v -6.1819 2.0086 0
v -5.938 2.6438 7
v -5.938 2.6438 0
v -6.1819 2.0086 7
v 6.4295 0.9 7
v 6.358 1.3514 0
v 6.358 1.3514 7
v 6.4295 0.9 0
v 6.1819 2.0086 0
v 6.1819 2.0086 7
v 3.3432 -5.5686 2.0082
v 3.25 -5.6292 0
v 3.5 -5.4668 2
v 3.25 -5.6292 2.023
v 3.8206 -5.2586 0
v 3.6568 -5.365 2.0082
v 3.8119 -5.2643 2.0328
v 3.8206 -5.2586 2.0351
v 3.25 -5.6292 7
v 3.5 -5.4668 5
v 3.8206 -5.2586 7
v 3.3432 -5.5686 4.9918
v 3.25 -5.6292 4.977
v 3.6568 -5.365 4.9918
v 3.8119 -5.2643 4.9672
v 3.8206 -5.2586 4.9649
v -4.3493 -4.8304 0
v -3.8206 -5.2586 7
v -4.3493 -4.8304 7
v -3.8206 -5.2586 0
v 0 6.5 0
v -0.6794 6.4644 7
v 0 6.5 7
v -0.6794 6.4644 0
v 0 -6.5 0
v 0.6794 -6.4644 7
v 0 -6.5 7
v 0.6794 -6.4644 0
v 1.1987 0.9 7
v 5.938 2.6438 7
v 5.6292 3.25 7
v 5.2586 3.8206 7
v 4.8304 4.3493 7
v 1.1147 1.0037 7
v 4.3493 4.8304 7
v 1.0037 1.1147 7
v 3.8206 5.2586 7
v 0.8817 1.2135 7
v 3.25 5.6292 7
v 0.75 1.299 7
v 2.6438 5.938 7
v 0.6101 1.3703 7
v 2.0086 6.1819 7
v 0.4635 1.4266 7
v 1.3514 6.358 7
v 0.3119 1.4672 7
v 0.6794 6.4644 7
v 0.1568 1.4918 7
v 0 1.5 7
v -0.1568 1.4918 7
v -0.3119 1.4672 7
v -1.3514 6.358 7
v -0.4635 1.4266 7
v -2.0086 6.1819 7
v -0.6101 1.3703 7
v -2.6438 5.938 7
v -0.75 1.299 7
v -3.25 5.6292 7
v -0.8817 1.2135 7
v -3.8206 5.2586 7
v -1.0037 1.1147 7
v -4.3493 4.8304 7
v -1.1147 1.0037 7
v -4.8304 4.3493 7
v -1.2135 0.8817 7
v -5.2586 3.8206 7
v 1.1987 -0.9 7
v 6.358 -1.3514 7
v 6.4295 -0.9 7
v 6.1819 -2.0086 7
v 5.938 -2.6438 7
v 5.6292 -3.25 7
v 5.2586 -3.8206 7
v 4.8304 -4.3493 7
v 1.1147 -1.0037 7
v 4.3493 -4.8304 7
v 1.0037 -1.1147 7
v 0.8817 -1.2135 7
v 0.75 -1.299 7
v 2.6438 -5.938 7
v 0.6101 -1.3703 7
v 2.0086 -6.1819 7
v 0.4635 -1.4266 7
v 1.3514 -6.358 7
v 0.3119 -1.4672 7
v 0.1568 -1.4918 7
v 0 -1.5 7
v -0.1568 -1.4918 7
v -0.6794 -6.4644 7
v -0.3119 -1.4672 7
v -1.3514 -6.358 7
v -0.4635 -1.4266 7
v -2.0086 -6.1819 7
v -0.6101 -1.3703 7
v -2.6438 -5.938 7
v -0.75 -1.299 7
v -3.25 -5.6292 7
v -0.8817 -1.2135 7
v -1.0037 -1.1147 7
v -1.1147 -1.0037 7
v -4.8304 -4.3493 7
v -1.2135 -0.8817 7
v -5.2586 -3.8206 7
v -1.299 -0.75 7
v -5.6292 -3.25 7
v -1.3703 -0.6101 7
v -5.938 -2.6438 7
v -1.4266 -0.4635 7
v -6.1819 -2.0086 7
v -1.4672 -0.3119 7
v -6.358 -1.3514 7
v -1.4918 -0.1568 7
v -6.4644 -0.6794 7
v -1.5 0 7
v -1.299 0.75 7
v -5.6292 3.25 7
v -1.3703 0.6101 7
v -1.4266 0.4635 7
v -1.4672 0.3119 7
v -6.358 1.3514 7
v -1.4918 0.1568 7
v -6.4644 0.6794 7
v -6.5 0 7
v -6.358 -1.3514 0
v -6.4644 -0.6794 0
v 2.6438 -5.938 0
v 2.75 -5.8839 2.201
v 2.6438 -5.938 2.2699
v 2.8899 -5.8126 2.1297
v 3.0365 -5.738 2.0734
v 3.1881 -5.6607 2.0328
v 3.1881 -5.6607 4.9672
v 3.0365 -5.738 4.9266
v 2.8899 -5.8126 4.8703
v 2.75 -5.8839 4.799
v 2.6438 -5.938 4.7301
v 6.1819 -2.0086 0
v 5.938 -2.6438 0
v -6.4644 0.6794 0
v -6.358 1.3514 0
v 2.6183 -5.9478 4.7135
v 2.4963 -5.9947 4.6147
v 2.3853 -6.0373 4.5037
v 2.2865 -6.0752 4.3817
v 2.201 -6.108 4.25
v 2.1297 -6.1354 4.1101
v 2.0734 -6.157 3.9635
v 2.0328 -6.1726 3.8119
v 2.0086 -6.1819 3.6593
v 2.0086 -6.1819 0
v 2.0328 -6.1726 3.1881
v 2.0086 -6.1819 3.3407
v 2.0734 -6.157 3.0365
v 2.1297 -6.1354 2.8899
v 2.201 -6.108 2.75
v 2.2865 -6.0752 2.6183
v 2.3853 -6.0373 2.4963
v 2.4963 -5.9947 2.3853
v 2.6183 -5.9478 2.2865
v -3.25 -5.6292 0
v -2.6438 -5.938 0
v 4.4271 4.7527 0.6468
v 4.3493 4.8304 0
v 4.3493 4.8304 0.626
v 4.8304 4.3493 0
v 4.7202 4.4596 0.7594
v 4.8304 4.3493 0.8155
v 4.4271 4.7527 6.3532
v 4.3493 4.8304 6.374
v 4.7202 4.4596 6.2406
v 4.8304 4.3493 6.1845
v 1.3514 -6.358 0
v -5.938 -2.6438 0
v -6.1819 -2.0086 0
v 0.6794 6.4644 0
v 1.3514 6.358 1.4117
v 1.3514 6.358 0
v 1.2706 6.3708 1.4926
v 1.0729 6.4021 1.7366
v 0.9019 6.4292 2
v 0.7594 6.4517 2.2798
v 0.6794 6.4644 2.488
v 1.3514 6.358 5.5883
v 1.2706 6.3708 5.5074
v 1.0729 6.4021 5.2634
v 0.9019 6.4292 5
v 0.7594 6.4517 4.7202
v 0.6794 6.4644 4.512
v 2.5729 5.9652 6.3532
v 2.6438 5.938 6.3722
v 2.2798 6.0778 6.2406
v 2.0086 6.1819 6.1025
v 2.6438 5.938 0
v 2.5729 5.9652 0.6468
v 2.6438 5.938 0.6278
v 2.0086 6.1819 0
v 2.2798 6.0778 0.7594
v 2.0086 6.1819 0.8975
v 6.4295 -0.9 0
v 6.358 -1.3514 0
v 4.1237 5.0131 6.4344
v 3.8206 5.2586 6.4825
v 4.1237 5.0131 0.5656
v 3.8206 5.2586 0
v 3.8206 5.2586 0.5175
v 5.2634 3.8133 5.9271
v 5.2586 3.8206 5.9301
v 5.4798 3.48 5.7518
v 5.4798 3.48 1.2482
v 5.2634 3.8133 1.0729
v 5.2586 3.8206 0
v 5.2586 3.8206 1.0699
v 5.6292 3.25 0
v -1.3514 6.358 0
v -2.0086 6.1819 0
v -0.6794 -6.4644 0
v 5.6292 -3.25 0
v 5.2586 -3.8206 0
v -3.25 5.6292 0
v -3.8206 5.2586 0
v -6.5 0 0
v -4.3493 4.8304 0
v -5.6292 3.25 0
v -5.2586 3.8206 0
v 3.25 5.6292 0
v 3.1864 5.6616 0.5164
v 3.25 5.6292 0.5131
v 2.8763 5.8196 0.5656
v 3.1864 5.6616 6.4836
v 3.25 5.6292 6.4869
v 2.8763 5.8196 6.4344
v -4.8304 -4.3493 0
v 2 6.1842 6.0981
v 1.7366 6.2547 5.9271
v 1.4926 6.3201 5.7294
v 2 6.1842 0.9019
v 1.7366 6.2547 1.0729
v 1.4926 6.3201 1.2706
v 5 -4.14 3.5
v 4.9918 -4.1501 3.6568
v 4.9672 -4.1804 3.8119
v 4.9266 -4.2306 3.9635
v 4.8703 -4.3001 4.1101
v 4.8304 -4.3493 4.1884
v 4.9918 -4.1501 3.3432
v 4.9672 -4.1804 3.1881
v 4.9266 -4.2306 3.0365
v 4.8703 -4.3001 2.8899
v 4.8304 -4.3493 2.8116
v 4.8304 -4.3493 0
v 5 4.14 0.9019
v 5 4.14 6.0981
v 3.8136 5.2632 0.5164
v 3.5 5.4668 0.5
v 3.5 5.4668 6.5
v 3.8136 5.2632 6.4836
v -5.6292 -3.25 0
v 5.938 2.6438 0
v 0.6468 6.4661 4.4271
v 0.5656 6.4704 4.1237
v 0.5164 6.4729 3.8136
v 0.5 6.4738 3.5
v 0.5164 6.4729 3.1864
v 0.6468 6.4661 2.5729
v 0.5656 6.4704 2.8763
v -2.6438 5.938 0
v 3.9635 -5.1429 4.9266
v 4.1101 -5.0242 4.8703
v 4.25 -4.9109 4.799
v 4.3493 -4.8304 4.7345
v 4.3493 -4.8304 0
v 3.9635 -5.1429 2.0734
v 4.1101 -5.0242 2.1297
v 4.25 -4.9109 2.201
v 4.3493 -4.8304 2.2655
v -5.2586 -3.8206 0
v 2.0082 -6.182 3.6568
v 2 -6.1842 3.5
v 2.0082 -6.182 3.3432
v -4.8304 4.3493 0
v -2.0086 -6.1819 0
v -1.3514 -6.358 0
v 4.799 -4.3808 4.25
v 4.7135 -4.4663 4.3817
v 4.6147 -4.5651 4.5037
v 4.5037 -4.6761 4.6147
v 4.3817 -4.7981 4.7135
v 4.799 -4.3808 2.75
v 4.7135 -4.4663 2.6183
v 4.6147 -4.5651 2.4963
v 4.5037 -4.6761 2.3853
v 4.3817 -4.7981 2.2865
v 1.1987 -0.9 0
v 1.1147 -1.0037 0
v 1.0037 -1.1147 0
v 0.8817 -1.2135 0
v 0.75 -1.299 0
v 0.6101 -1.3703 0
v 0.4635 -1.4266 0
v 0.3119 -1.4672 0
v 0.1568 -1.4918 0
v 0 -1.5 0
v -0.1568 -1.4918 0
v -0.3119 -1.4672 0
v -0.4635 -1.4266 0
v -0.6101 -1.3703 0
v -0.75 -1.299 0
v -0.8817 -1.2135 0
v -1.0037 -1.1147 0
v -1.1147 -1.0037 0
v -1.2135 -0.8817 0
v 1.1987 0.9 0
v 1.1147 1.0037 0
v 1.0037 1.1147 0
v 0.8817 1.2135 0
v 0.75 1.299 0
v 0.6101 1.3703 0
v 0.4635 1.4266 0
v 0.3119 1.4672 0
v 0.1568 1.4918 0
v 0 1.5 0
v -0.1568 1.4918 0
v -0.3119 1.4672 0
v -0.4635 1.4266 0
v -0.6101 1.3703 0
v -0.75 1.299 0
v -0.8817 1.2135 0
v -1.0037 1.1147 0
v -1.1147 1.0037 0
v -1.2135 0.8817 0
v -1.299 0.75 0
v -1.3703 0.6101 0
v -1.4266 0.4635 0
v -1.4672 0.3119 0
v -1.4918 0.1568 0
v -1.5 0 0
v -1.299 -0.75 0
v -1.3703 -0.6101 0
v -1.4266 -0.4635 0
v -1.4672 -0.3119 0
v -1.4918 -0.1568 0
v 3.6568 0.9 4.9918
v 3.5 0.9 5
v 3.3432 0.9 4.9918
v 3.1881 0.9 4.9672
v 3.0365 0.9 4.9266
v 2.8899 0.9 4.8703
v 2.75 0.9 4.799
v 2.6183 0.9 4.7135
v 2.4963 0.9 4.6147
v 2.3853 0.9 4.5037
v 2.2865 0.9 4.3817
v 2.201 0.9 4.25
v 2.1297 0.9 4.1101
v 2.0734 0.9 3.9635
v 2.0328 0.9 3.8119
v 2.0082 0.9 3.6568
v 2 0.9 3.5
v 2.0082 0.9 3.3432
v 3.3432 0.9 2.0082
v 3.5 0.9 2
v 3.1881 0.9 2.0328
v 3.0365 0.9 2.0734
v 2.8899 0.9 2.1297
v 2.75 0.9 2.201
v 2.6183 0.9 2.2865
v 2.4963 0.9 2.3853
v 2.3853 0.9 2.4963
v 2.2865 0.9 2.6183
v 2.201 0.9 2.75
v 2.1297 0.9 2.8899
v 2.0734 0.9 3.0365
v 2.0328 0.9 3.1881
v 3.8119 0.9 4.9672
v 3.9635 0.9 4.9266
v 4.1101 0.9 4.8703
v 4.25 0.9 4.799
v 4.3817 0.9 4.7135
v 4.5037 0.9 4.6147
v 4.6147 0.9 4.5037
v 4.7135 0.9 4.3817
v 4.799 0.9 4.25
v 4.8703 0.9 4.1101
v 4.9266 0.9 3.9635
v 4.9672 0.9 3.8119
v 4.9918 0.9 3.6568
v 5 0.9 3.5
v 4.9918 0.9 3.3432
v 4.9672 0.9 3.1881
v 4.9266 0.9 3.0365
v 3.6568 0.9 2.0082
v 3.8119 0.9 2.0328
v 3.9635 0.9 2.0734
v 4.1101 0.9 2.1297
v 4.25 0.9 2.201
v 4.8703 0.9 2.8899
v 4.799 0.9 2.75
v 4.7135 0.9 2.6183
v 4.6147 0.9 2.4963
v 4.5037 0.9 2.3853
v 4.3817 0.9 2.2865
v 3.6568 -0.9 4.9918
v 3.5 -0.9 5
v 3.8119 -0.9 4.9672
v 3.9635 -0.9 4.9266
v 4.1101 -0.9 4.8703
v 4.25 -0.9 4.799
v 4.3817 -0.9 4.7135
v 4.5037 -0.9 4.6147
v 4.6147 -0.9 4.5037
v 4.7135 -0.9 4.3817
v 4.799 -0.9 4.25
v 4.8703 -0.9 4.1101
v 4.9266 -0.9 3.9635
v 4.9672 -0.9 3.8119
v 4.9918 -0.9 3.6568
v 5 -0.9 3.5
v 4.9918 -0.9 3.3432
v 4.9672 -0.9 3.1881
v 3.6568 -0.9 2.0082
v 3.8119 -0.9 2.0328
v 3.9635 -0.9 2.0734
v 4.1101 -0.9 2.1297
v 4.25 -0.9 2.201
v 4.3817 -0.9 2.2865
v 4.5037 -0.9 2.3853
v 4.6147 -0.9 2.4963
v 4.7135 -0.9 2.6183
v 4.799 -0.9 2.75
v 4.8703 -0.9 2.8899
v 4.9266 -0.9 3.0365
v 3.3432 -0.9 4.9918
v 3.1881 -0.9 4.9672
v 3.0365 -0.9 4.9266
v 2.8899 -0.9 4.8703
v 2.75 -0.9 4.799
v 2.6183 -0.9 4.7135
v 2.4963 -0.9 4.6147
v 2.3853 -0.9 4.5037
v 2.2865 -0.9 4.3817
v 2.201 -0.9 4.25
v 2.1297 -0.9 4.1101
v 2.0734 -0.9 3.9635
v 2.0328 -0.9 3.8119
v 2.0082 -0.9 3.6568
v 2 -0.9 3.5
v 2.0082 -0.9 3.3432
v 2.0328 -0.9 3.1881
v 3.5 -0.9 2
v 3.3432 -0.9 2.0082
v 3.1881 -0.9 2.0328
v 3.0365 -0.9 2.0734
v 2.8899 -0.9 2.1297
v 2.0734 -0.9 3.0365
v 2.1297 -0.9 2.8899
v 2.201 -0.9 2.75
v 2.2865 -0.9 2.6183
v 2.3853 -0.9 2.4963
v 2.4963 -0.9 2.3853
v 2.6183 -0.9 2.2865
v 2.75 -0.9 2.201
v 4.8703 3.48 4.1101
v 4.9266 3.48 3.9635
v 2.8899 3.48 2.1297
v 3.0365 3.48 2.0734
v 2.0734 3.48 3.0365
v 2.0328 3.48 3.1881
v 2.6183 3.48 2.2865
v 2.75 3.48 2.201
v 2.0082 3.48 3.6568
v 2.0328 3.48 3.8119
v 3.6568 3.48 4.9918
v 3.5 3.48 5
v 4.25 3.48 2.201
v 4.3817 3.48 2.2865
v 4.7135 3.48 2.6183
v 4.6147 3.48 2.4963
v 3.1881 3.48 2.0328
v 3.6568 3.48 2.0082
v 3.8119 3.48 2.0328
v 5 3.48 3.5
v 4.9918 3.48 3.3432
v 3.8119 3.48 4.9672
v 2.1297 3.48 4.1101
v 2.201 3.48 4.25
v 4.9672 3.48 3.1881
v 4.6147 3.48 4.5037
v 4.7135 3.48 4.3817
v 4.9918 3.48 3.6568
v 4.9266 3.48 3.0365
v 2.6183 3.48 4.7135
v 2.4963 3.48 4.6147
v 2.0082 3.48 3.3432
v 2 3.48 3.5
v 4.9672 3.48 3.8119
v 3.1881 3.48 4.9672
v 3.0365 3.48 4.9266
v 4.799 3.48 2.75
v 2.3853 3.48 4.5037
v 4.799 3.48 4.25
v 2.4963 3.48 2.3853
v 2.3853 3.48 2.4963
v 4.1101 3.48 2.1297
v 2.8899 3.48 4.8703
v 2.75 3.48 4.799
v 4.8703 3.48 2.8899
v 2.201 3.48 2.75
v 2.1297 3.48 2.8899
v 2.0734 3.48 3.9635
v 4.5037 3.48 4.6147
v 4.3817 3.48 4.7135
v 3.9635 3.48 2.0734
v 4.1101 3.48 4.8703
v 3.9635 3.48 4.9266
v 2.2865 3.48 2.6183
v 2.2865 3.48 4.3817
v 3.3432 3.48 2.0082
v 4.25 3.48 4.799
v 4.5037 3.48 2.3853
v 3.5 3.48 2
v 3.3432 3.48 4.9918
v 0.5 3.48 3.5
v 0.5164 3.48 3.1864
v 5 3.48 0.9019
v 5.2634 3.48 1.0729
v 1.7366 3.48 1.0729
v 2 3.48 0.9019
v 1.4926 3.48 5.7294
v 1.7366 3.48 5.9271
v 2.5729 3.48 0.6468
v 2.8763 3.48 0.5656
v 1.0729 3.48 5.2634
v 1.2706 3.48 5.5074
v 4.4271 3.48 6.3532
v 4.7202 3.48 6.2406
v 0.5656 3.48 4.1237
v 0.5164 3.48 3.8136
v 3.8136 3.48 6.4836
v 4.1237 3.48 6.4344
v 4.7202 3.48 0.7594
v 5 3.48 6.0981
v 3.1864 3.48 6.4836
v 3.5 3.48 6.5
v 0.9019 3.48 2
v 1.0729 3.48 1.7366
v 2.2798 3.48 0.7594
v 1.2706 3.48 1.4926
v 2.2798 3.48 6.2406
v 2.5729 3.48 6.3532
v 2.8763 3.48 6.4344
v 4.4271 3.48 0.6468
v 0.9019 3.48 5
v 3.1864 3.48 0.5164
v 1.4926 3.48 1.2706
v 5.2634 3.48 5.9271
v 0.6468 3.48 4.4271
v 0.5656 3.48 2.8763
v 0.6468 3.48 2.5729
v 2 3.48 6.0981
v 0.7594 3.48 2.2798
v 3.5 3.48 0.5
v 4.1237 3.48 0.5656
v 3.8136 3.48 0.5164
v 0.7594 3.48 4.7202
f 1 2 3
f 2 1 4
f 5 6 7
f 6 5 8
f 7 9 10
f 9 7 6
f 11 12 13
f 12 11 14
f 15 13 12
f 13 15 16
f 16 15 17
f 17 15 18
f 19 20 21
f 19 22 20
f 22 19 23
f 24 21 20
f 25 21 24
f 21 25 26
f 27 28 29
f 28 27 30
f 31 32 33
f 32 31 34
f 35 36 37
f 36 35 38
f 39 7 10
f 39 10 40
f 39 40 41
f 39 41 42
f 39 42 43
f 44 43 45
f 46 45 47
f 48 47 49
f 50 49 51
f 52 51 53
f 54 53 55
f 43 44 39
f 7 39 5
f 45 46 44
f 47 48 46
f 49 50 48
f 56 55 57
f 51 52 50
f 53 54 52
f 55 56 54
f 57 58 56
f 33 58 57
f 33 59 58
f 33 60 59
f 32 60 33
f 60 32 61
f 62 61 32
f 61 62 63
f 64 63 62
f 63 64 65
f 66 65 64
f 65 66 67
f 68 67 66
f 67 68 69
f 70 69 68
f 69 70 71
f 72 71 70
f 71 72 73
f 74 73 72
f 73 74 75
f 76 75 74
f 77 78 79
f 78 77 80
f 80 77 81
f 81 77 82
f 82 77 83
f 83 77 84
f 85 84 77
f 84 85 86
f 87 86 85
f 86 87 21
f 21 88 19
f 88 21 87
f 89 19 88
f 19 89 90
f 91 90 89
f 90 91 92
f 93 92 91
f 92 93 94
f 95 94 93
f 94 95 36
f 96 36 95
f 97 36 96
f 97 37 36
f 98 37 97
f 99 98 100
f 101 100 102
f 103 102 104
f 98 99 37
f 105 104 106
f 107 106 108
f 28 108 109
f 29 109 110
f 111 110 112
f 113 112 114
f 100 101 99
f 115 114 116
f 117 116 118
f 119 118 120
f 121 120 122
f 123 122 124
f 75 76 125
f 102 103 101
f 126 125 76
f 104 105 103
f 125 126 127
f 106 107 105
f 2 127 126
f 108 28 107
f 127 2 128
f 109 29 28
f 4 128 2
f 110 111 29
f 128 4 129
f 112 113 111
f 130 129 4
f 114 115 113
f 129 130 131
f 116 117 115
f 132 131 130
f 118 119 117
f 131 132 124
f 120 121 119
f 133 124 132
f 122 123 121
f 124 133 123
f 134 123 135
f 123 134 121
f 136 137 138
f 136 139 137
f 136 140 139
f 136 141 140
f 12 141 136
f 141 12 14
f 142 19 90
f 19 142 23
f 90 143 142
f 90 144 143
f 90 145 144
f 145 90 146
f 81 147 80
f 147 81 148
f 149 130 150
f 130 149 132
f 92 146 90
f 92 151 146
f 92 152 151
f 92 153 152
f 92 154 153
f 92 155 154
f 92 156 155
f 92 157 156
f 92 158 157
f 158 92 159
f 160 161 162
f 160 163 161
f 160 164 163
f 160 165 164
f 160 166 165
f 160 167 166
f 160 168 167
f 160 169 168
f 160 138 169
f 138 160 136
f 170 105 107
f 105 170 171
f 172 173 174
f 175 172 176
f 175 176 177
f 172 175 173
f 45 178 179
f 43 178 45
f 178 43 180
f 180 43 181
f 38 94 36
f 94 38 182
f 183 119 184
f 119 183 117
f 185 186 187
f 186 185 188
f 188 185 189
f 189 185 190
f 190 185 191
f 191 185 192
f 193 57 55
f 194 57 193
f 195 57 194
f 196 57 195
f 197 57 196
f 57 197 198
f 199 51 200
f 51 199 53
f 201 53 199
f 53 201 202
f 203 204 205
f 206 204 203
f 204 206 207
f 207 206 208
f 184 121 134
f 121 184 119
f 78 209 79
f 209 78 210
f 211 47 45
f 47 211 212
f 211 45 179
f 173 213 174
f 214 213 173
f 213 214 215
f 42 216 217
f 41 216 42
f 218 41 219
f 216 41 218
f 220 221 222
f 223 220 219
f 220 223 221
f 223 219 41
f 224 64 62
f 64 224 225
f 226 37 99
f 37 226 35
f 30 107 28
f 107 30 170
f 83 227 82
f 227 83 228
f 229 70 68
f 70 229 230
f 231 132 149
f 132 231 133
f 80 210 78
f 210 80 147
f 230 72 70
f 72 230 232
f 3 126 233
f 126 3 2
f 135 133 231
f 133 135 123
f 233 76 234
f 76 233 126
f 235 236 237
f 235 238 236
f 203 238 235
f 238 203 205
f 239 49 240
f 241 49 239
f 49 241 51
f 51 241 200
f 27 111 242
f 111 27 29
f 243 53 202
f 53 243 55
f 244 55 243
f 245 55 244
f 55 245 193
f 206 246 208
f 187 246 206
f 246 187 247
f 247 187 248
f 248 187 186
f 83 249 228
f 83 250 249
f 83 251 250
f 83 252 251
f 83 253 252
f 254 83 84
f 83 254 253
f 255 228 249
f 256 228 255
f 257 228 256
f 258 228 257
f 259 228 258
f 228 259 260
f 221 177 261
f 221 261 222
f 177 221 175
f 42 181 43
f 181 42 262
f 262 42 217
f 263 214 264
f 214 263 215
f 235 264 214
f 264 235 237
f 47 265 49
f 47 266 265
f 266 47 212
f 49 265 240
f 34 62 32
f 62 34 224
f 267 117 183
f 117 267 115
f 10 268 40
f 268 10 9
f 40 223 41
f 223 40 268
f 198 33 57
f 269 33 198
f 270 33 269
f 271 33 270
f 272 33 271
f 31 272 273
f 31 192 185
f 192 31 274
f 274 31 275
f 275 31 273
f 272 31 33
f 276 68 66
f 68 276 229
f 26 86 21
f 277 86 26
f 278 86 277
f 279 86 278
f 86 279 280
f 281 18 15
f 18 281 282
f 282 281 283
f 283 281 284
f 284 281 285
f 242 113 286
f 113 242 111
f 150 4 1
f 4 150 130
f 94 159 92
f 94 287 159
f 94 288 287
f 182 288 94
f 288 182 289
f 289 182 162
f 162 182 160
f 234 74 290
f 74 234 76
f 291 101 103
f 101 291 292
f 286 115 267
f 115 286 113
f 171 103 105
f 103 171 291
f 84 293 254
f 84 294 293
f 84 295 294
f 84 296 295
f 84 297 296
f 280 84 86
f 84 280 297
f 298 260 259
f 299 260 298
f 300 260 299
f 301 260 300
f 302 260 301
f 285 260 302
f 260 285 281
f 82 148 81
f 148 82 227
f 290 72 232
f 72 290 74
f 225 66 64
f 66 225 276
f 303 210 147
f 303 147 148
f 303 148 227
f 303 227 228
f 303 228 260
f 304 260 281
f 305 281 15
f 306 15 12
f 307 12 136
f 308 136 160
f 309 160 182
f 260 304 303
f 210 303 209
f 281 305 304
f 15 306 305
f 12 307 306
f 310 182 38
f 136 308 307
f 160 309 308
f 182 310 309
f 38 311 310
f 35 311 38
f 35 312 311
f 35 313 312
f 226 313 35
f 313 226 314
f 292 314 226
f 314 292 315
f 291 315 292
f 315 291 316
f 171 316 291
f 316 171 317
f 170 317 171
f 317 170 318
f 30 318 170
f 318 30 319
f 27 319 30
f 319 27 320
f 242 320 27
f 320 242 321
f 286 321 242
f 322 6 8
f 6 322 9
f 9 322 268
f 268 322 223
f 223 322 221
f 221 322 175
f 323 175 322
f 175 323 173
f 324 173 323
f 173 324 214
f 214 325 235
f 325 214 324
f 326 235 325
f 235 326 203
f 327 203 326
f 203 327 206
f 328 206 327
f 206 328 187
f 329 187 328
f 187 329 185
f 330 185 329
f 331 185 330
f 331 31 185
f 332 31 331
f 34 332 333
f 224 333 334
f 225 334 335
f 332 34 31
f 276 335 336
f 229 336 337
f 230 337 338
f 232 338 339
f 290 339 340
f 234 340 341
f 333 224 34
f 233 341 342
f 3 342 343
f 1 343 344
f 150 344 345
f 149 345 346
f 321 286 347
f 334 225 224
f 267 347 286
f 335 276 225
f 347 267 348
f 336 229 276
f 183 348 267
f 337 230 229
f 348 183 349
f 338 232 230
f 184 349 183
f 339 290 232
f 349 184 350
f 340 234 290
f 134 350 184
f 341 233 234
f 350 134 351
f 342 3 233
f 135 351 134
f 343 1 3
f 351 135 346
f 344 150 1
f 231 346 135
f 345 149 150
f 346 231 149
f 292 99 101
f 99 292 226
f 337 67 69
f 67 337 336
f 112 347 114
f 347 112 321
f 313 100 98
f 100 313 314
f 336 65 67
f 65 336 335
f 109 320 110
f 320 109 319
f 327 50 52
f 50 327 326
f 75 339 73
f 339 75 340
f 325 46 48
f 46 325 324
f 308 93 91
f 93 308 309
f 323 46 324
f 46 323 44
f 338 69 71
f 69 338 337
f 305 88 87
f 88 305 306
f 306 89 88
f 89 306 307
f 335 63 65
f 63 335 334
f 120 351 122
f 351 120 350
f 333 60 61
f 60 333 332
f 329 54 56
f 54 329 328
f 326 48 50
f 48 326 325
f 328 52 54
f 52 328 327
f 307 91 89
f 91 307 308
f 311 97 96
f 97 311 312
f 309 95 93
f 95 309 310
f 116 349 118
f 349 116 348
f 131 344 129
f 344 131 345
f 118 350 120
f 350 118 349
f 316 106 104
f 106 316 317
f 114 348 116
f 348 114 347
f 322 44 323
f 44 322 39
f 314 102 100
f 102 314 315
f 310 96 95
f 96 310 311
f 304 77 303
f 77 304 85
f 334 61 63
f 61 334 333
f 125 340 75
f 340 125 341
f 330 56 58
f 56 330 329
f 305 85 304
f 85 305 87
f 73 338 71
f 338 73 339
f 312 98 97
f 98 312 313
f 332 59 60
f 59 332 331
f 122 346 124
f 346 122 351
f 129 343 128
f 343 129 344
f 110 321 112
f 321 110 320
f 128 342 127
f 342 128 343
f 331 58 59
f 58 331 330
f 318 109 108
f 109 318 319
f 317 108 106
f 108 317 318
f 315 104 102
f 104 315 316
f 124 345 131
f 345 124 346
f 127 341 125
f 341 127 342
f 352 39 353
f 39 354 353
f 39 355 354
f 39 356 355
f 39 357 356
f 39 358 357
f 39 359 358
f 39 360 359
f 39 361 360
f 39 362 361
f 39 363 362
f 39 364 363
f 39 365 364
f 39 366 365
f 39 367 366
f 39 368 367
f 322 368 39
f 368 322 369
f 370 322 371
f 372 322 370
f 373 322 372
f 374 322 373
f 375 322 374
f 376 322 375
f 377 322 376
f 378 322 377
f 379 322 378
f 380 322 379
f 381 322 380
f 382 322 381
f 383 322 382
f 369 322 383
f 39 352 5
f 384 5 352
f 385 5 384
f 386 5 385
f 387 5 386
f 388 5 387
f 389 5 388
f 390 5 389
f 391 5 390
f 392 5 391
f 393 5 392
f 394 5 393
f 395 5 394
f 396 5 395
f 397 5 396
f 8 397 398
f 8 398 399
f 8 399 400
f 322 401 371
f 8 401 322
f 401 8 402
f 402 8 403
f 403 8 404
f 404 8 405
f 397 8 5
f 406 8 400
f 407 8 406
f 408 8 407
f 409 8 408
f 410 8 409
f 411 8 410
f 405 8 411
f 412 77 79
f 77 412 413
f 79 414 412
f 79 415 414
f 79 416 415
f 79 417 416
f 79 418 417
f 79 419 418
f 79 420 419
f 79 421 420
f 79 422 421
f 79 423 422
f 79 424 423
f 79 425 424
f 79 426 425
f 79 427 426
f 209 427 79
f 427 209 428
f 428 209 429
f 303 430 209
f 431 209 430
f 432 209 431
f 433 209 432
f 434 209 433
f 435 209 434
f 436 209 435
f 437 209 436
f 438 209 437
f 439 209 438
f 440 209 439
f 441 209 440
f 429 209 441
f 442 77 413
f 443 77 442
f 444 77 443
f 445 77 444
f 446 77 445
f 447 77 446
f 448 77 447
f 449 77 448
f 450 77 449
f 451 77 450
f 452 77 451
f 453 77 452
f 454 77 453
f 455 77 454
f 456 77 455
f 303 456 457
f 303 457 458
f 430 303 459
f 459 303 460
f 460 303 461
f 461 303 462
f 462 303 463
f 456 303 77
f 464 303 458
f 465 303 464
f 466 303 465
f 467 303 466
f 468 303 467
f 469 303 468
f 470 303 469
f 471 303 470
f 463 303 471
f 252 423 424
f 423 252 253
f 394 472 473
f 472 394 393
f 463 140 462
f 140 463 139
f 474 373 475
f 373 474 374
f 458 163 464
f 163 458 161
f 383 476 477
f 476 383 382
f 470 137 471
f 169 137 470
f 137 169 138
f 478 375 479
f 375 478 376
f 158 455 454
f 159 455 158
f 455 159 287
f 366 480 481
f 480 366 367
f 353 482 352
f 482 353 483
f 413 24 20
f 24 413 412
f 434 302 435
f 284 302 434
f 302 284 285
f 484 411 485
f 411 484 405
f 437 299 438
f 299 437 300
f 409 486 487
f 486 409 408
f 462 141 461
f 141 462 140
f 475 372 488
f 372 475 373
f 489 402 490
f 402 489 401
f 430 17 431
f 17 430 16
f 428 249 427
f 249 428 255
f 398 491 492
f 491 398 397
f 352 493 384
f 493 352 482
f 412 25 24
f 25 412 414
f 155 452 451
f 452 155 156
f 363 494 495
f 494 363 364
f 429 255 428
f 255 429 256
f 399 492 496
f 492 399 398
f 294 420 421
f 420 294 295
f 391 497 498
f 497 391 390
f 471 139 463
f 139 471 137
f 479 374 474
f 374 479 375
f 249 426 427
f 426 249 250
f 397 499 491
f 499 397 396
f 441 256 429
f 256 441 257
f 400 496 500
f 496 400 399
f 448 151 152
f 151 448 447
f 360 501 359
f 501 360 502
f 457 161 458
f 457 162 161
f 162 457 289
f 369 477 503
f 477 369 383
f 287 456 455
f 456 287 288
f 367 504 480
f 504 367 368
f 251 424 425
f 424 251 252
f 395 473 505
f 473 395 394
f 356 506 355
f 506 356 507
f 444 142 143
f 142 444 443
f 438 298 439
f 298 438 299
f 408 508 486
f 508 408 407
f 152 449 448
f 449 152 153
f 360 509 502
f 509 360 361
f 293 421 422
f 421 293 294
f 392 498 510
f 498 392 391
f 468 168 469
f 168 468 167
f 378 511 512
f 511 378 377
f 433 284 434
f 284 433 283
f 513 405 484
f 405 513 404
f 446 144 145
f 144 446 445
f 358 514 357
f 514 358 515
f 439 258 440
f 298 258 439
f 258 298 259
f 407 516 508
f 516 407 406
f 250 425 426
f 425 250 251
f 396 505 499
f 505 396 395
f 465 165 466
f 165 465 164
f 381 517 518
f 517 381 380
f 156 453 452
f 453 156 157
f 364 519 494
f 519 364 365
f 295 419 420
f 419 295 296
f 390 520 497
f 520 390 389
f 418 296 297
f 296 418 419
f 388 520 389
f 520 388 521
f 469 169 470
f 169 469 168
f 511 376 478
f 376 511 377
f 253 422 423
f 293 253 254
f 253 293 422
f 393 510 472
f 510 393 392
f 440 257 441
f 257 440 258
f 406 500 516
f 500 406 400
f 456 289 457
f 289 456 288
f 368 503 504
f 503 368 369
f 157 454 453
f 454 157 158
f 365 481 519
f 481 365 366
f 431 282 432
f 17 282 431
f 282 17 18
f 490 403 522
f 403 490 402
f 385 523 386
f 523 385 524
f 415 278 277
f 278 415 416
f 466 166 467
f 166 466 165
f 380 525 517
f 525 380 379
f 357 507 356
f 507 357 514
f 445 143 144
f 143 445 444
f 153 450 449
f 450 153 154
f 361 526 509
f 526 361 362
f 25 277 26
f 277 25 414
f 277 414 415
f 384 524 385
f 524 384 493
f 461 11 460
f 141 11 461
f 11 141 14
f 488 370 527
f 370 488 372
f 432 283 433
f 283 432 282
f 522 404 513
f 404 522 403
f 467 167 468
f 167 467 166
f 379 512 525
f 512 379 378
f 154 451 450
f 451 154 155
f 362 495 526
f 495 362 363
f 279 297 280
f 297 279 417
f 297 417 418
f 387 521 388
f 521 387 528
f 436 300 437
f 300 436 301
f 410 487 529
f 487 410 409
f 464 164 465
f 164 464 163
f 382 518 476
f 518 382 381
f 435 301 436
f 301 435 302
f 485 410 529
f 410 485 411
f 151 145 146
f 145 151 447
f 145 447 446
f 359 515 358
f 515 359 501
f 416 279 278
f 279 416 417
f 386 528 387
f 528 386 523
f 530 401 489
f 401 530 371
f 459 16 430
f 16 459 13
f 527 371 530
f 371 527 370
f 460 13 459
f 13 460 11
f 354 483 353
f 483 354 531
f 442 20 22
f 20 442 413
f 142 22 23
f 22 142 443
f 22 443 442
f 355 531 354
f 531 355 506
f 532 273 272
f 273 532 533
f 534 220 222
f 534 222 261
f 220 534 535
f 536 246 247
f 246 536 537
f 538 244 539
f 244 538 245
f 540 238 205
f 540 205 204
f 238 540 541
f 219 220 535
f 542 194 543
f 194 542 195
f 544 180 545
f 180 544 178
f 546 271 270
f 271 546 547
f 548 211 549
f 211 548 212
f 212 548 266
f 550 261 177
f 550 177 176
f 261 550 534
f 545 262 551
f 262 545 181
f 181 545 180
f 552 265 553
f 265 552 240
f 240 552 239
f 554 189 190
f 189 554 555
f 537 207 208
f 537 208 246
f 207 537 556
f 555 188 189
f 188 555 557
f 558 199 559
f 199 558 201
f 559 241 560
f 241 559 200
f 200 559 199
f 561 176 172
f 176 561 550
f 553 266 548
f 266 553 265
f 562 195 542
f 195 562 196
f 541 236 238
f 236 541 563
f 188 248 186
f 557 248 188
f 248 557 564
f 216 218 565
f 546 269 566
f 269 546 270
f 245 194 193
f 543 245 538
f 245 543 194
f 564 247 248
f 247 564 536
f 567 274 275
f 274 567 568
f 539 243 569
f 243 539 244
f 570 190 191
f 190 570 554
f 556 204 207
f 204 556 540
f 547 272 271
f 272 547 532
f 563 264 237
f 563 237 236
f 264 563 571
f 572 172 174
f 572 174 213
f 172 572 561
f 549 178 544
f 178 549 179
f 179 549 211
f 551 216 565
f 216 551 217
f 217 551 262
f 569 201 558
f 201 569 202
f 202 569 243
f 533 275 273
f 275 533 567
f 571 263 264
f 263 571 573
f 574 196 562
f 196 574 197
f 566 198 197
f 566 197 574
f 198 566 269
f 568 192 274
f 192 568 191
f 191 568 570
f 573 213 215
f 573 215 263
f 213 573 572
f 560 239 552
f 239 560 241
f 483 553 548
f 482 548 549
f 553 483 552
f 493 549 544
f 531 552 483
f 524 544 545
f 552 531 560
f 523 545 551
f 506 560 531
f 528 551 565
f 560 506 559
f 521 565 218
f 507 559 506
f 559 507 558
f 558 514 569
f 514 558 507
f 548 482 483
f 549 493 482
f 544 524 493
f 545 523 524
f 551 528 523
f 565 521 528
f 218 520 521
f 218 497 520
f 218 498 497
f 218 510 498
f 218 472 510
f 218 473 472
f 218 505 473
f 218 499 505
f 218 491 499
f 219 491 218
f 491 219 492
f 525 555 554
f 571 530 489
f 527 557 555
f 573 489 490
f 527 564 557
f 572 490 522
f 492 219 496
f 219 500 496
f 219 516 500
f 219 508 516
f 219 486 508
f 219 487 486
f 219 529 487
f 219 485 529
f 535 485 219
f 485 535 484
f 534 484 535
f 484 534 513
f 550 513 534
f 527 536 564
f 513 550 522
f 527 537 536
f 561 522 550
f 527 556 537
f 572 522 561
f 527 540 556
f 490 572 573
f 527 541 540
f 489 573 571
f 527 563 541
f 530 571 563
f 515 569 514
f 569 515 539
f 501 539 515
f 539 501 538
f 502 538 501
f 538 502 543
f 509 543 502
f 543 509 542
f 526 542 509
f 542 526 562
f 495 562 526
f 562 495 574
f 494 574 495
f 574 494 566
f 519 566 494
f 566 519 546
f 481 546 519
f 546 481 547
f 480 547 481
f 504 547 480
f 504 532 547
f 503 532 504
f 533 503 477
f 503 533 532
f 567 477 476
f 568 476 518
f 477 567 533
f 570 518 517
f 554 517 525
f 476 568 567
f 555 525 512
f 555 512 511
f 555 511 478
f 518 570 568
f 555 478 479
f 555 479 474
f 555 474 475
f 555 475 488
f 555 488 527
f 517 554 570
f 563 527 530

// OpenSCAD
// C-style split collar for 3 mm shaft.
$fn = 60;
eps = 0.02;
shaft_d = 3;
outer_d = 13;
width = 7;
slit_w = 1.8;
screw_d = 3.0;
difference() {
    cylinder(d = outer_d, h = width);
    translate([0, 0, -eps]) cylinder(d = shaft_d, h = width + 2 * eps);
    translate([0, -slit_w / 2, -eps]) cube([outer_d / 2 + eps, slit_w, width + 2 * eps]);
    translate([outer_d / 2 - 3, -outer_d / 2 - eps, width / 2]) rotate([-90, 0, 0]) cylinder(d = screw_d, h = outer_d + 2 * eps);
    translate([outer_d / 2 - 3, outer_d / 2 - 3 - eps, width / 2]) rotate([-90, 0, 0]) cylinder(d = screw_d + 3, h = 3 + 2 * eps);
}
